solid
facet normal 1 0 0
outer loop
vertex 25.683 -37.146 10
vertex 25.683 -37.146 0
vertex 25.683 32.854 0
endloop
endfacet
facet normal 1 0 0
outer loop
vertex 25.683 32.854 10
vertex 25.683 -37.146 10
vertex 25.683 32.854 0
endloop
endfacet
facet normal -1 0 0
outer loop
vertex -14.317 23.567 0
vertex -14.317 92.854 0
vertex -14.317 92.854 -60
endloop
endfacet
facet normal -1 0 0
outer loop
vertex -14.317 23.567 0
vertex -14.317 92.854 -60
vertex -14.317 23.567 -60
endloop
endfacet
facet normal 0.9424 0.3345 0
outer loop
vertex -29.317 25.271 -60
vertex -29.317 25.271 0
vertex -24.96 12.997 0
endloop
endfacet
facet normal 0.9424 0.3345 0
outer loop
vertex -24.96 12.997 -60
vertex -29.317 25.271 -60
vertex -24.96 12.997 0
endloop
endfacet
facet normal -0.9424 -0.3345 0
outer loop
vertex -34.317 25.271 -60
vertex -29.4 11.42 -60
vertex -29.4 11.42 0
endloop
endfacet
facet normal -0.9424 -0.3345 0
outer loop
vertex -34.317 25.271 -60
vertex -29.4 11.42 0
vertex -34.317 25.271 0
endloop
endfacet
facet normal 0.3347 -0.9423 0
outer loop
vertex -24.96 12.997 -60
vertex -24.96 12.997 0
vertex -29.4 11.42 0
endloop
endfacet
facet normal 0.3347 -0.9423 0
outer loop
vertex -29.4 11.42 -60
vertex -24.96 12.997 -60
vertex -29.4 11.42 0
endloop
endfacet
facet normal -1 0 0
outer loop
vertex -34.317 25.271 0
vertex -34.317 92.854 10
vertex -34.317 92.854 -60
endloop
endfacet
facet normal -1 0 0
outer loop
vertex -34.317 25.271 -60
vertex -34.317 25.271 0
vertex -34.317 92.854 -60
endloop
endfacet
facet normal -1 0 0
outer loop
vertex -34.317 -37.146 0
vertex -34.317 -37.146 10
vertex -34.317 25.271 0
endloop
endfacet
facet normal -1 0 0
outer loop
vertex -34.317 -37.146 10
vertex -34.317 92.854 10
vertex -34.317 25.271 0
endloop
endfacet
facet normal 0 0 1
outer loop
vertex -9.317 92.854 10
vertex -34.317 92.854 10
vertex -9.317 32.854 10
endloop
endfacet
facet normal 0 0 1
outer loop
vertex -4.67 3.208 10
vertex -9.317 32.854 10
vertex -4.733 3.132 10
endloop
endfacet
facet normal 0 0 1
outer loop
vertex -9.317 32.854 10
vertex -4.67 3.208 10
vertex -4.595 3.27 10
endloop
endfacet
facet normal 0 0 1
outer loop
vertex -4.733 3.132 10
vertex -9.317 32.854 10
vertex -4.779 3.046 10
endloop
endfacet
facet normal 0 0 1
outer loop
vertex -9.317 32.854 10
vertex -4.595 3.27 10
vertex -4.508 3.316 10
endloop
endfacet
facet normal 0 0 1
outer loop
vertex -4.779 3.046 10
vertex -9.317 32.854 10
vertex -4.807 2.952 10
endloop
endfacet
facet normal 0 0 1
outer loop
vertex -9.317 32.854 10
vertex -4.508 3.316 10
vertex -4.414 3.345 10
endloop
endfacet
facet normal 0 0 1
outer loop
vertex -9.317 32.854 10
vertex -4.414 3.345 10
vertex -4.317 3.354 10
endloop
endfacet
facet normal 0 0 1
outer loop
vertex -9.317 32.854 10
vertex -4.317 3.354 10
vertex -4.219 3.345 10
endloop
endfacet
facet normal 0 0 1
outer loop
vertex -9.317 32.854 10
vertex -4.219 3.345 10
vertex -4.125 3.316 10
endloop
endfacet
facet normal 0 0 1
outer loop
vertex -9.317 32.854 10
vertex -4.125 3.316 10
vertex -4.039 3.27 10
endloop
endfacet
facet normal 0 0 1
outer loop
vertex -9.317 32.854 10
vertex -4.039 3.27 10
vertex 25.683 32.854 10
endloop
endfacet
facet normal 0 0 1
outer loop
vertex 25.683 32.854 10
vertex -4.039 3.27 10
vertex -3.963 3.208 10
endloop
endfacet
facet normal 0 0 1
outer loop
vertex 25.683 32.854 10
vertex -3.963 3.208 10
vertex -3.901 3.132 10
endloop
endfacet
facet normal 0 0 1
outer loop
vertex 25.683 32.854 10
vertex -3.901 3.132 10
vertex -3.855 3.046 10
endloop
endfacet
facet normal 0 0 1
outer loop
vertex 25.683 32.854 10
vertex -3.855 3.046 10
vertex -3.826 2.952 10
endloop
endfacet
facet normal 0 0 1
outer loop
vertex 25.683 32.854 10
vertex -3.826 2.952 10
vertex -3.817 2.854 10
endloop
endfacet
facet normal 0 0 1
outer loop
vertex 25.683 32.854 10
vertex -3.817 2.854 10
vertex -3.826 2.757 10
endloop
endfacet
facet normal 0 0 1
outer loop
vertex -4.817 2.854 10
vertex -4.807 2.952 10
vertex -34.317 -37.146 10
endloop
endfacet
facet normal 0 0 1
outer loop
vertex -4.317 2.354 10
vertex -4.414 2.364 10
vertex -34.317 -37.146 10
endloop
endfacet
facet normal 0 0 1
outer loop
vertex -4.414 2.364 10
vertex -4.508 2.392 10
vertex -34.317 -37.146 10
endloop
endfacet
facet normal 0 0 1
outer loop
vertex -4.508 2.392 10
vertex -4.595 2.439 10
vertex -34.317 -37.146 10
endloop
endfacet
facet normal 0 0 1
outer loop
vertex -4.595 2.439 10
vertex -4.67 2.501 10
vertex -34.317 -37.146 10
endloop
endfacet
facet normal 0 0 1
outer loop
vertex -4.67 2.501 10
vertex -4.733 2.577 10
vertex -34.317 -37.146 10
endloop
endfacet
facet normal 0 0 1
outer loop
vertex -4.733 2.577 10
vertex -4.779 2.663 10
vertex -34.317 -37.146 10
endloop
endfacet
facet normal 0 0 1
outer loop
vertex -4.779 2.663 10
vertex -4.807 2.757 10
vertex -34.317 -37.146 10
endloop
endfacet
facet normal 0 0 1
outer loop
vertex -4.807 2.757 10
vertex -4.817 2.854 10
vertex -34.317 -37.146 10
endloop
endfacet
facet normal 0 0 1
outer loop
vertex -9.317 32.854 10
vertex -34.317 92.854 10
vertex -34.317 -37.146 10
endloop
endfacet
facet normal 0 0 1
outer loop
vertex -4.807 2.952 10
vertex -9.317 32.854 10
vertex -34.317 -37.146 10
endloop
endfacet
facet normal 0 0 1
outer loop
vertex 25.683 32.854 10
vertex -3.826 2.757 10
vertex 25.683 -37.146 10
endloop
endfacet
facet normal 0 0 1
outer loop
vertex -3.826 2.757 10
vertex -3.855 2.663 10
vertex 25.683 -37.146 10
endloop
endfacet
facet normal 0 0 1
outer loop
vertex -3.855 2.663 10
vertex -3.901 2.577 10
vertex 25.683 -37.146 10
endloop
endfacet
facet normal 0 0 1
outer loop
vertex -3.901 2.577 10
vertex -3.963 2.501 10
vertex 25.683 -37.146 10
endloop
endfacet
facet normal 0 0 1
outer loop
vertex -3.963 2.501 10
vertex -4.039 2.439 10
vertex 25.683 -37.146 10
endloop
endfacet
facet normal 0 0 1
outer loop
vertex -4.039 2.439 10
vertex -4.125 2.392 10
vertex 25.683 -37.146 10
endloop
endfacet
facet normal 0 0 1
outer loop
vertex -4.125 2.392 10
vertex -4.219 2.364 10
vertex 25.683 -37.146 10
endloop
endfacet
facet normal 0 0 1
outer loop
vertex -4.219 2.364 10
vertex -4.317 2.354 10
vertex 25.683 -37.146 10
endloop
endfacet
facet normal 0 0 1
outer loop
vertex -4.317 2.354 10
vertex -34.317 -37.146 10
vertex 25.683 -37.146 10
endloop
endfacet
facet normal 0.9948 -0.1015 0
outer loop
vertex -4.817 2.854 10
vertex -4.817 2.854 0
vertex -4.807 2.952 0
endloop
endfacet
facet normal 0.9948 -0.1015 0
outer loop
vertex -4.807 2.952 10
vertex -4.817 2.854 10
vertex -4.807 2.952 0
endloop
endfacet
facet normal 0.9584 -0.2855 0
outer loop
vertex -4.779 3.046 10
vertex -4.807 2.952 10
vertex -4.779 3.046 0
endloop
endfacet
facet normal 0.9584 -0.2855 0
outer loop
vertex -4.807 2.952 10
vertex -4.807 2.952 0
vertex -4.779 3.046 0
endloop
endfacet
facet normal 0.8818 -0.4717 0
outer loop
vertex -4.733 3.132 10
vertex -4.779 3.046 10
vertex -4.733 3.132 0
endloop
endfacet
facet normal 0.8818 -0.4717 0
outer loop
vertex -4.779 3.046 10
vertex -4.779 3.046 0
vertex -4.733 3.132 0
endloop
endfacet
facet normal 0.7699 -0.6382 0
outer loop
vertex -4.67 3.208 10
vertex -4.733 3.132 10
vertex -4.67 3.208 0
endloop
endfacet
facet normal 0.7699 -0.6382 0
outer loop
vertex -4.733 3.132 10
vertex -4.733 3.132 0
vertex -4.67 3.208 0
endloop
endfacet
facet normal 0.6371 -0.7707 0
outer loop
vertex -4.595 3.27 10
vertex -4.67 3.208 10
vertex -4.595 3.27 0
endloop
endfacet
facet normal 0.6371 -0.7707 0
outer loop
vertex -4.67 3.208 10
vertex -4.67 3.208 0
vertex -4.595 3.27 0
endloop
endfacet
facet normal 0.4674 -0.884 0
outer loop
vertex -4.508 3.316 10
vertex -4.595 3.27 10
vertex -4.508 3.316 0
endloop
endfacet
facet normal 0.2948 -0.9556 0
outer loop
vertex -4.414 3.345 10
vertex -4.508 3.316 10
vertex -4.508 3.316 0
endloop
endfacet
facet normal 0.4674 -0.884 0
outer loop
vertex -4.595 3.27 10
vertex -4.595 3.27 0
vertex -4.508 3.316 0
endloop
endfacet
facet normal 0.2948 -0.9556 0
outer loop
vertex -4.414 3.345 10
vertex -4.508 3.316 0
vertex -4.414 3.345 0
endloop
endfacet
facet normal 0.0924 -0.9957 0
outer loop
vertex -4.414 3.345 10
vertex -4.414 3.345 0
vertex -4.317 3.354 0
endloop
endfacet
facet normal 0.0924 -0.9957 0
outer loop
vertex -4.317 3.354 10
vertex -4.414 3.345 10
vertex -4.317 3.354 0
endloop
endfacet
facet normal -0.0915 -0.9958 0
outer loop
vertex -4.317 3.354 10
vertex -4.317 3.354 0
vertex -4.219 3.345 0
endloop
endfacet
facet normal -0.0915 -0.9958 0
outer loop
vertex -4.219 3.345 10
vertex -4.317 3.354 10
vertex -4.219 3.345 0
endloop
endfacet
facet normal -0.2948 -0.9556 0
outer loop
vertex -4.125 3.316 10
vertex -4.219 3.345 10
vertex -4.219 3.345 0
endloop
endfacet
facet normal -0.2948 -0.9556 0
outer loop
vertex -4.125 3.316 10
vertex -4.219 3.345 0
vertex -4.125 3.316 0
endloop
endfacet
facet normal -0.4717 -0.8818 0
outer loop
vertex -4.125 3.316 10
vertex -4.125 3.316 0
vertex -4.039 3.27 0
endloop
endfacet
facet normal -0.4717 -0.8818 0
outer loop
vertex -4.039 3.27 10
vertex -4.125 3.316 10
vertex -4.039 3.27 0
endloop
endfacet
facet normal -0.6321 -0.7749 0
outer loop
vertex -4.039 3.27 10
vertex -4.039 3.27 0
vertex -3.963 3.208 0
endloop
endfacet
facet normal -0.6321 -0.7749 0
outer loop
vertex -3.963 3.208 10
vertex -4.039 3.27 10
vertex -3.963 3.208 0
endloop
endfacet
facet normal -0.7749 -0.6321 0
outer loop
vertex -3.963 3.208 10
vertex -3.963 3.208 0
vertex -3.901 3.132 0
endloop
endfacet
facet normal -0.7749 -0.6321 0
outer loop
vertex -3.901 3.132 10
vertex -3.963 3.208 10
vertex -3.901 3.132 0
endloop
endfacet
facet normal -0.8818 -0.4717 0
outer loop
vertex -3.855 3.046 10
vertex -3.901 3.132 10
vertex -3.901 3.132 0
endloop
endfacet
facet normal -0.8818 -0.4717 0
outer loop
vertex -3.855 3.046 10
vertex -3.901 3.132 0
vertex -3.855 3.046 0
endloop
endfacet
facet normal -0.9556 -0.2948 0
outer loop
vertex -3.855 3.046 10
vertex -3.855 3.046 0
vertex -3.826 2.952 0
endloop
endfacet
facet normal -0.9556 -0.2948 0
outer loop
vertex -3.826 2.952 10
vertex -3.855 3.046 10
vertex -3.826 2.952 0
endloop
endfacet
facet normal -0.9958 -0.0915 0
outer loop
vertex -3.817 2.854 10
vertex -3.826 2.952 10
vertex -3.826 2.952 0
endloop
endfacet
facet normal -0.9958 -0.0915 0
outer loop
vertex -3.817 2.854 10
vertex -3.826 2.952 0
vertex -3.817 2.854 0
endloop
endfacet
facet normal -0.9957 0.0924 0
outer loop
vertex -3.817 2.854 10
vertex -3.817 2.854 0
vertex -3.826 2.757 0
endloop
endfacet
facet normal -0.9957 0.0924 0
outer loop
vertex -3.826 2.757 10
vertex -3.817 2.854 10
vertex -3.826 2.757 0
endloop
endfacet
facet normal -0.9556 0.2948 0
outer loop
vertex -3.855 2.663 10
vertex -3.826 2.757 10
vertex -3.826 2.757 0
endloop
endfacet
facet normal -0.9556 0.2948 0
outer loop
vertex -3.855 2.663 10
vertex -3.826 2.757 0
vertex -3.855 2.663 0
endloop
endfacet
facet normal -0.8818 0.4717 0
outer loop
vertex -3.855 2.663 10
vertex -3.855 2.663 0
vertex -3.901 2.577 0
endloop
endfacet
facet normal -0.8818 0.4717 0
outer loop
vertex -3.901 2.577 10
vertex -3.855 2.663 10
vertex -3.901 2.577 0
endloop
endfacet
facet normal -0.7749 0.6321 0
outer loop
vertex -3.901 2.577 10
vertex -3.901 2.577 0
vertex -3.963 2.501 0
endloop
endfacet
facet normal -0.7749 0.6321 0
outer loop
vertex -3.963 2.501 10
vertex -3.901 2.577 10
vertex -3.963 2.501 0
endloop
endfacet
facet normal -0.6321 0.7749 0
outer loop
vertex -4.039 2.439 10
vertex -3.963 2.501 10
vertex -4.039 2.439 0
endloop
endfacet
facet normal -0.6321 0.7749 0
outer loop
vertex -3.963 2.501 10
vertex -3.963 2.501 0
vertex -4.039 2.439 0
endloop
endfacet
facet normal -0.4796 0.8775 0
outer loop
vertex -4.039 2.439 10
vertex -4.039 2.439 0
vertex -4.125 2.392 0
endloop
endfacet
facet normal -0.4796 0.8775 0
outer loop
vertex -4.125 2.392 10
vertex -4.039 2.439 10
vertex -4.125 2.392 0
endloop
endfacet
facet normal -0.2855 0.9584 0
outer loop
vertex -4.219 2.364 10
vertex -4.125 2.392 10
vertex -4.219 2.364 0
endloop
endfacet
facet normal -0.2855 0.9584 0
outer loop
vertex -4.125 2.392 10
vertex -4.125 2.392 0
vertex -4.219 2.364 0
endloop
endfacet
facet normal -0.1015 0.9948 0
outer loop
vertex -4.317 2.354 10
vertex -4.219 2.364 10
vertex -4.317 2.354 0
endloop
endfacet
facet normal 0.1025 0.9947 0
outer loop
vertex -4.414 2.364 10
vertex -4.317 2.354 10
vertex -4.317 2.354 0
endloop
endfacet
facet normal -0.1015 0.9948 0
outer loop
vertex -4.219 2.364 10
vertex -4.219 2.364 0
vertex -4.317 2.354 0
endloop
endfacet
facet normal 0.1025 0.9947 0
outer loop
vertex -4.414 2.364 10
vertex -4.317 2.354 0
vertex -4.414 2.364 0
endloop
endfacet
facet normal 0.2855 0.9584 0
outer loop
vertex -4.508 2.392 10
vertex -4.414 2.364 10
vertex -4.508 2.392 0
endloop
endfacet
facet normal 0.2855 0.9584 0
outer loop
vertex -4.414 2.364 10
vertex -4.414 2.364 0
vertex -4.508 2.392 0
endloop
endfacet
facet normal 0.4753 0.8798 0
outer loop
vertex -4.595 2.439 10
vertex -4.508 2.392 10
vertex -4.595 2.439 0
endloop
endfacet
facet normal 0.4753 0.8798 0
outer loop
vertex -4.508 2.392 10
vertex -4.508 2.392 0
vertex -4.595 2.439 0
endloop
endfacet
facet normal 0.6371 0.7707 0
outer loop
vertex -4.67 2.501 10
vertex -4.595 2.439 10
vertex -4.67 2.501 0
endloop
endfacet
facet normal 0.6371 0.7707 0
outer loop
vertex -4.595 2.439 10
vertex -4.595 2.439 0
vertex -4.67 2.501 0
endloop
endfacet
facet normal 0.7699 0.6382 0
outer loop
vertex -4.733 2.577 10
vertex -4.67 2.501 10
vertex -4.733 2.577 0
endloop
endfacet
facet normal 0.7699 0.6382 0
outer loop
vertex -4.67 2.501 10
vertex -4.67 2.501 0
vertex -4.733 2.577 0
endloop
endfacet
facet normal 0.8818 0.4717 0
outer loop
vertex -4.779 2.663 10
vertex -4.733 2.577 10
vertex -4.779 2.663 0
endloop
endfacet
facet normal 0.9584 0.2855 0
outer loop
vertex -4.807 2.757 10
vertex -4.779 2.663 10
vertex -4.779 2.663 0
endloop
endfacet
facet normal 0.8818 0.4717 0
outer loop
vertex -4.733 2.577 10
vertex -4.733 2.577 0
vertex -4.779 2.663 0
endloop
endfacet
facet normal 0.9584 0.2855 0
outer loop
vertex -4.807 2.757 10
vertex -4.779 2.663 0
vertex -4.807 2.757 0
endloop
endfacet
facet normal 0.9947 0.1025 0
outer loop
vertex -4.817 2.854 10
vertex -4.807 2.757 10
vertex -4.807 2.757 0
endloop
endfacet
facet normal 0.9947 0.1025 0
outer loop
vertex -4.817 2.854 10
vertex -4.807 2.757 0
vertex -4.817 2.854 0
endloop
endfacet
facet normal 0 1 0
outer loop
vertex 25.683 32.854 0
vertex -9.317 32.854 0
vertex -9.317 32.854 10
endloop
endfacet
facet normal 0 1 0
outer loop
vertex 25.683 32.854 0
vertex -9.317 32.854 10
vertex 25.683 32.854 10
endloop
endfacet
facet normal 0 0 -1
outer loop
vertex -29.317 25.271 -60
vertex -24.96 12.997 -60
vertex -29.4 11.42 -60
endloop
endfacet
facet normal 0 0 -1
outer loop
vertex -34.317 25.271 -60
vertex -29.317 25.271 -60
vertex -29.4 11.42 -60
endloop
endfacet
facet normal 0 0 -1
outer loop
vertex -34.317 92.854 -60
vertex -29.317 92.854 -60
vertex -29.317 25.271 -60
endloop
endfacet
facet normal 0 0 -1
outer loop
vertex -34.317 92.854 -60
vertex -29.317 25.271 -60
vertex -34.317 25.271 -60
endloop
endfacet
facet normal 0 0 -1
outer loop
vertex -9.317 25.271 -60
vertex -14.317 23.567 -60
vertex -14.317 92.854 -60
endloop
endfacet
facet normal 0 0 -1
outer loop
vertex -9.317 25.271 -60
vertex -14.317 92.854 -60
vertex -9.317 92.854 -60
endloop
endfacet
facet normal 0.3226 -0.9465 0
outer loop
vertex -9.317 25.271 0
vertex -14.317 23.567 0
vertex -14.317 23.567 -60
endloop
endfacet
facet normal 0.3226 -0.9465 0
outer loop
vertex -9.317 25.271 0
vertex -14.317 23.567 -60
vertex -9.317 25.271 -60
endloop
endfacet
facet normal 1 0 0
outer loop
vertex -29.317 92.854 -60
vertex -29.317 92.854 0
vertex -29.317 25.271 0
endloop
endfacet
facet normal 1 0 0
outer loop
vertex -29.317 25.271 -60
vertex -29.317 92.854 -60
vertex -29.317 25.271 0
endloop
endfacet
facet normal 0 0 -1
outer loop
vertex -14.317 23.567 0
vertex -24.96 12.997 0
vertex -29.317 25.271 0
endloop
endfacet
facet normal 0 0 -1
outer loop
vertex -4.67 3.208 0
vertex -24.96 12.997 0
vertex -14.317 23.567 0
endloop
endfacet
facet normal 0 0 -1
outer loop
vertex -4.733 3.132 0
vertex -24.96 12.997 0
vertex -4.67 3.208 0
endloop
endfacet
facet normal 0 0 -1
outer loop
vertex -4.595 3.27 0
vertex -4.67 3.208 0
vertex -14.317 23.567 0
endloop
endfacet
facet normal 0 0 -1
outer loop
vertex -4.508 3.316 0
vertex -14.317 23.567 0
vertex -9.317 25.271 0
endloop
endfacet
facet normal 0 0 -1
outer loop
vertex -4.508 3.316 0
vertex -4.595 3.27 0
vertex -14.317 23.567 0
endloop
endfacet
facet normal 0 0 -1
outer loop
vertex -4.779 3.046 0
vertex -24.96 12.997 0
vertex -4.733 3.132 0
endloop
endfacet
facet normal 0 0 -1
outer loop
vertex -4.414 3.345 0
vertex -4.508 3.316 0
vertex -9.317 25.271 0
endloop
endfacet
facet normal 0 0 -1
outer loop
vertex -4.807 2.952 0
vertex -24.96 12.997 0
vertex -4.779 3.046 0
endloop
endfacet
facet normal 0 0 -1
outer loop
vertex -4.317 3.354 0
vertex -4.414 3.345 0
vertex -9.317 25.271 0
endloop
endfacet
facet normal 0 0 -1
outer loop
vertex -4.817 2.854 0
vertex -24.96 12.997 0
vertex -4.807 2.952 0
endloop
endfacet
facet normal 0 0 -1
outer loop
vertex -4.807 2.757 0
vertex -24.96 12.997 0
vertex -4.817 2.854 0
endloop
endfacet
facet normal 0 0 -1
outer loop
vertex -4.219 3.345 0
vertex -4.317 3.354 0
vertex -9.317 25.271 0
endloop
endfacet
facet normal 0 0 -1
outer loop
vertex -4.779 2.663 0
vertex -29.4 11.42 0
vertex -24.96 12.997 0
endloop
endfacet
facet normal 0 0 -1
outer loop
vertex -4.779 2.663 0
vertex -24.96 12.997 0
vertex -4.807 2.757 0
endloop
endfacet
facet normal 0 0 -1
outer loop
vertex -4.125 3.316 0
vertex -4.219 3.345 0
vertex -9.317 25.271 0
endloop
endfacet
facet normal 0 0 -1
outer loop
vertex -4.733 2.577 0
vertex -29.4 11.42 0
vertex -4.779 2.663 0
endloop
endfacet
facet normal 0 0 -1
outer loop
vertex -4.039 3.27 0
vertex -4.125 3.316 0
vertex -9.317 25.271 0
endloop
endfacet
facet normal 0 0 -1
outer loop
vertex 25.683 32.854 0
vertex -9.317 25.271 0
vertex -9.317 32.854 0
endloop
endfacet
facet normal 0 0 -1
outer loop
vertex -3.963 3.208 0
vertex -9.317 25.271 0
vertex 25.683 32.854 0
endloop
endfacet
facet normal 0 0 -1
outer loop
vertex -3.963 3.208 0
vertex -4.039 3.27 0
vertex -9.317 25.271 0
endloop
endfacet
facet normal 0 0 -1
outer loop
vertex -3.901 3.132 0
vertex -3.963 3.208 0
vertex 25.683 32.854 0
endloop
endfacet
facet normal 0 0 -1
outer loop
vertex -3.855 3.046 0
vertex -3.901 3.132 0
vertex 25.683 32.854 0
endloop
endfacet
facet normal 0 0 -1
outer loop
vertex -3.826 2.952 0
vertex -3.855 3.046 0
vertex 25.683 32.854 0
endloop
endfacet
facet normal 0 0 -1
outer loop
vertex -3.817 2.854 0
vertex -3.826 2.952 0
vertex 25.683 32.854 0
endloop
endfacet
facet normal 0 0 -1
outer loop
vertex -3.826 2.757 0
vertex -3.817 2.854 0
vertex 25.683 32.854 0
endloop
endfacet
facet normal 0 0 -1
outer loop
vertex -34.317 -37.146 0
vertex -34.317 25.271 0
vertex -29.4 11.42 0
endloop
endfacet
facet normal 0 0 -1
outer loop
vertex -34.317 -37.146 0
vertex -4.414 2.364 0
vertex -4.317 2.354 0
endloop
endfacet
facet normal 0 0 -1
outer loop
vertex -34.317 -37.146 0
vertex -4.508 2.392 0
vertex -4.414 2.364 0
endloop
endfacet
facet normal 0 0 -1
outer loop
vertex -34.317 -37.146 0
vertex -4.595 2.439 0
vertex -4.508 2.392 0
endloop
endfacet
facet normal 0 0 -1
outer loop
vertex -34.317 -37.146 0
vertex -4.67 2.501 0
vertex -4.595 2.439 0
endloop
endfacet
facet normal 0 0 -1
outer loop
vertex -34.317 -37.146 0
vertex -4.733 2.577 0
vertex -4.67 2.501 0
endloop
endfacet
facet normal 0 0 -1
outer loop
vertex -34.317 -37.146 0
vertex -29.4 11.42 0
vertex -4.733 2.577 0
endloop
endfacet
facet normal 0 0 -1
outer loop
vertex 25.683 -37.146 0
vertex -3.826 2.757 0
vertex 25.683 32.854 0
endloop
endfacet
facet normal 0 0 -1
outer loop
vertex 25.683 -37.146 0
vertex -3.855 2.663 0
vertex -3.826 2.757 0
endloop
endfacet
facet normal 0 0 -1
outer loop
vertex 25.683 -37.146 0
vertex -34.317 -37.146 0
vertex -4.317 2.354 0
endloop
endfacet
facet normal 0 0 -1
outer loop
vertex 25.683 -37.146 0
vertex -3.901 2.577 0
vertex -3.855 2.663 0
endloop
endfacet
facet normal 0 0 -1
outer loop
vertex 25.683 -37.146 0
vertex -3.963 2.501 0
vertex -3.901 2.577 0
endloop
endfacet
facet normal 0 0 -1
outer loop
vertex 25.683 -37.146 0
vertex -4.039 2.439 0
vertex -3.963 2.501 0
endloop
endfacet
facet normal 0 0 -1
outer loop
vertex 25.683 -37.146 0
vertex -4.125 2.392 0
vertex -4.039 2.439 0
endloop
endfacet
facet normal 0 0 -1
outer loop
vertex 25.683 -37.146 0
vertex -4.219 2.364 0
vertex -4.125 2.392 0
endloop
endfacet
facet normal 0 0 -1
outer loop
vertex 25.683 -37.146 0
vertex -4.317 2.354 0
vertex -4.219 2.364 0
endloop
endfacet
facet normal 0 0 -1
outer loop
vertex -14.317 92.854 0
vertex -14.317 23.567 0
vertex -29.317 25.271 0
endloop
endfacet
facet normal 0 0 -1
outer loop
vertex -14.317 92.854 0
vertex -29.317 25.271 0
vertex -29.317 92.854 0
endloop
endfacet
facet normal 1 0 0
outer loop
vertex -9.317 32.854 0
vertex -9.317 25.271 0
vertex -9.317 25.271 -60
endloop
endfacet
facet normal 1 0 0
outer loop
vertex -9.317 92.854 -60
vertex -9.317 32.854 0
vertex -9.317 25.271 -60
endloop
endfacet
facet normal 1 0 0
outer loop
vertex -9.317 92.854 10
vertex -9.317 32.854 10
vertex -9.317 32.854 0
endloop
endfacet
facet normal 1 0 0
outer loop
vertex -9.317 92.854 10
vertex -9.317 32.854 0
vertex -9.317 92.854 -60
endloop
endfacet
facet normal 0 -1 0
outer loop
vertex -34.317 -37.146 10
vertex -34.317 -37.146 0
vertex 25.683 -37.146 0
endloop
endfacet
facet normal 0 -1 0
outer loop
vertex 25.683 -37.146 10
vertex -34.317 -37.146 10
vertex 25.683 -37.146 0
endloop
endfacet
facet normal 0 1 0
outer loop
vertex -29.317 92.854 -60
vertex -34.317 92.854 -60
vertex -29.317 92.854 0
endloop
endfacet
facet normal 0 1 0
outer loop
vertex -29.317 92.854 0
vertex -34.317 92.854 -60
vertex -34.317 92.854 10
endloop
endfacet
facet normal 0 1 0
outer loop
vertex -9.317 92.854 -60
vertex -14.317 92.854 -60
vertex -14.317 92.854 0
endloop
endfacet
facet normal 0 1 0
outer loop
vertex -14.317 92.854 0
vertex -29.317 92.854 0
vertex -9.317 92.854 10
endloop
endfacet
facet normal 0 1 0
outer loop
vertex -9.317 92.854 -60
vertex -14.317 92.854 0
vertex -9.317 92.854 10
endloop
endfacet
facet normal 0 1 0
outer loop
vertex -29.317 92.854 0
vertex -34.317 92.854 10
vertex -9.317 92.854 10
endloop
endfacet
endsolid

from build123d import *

# Parameters (mm, degrees)
ESQUISSE1_W      = 60
ESQUISSE1_H      = 70
EXTRUSION1_DEPTH = 10
EXTRUSION2_REACH = 53.55
ESQUISSE2_R      = 0.5
ESQUISSE4_W      = 25
ESQUISSE4_H      = 10
EXTRUSION3_DEPTH = 60
EXTRUSION4_DEPTH = 60


with BuildPart() as part:
    # Esquisse1 → Extrusion1 (new body)
    with BuildSketch(Plane.XY):
        with Locations((-4.316825769, -2.145652174)):
            Rectangle(ESQUISSE1_W, ESQUISSE1_H)
    extrude(amount=EXTRUSION1_DEPTH)

    # Esquisse2 → Extrusion2 (cut, up to next)
    with BuildSketch(Plane(origin=(0, 0, 0), x_dir=(-1, 0, 0), z_dir=(0, 0, -1)), mode=Mode.PRIVATE) as extrusion2_sk1:
        with Locations((4.316825769, 2.854347826)):
            Circle(ESQUISSE2_R)
    extrusion2_tool1 = extrude(extrusion2_sk1.sketch, amount=-EXTRUSION2_REACH, mode=Mode.PRIVATE) & part.part
    add(extrusion2_tool1.solids().sort_by_distance((-4.316826, 2.854348, 0))[0], mode=Mode.SUBTRACT)

    # Esquisse4 → Extrusion3 (add)
    with BuildSketch(Plane(origin=(0, 32.854347826, 0), x_dir=(1, 0, 0), z_dir=(0, 1, 0))):
        with Locations((-21.816825769, -5)):
            Rectangle(ESQUISSE4_W, ESQUISSE4_H)
    extrude(amount=EXTRUSION3_DEPTH)

    # Esquisse5 → Extrusion4 (add)
    with BuildSketch(Plane(origin=(0, 0, 0), x_dir=(-1, 0, 0), z_dir=(0, 0, -1))):
        Polygon((29.316825769, 25.271005401), (24.959851341, 12.996610653), (29.400349472, 11.420391442), (34.316825769, 25.271005401), (34.316825769, 92.854347826), (29.316825769, 92.854347826), align=None)
        Polygon((9.316825769, 92.854347826), (14.316825769, 92.854347826), (14.316825769, 23.566663003), (9.316825769, 25.271005401), align=None)
    extrude(amount=EXTRUSION4_DEPTH)


solid = part.part
